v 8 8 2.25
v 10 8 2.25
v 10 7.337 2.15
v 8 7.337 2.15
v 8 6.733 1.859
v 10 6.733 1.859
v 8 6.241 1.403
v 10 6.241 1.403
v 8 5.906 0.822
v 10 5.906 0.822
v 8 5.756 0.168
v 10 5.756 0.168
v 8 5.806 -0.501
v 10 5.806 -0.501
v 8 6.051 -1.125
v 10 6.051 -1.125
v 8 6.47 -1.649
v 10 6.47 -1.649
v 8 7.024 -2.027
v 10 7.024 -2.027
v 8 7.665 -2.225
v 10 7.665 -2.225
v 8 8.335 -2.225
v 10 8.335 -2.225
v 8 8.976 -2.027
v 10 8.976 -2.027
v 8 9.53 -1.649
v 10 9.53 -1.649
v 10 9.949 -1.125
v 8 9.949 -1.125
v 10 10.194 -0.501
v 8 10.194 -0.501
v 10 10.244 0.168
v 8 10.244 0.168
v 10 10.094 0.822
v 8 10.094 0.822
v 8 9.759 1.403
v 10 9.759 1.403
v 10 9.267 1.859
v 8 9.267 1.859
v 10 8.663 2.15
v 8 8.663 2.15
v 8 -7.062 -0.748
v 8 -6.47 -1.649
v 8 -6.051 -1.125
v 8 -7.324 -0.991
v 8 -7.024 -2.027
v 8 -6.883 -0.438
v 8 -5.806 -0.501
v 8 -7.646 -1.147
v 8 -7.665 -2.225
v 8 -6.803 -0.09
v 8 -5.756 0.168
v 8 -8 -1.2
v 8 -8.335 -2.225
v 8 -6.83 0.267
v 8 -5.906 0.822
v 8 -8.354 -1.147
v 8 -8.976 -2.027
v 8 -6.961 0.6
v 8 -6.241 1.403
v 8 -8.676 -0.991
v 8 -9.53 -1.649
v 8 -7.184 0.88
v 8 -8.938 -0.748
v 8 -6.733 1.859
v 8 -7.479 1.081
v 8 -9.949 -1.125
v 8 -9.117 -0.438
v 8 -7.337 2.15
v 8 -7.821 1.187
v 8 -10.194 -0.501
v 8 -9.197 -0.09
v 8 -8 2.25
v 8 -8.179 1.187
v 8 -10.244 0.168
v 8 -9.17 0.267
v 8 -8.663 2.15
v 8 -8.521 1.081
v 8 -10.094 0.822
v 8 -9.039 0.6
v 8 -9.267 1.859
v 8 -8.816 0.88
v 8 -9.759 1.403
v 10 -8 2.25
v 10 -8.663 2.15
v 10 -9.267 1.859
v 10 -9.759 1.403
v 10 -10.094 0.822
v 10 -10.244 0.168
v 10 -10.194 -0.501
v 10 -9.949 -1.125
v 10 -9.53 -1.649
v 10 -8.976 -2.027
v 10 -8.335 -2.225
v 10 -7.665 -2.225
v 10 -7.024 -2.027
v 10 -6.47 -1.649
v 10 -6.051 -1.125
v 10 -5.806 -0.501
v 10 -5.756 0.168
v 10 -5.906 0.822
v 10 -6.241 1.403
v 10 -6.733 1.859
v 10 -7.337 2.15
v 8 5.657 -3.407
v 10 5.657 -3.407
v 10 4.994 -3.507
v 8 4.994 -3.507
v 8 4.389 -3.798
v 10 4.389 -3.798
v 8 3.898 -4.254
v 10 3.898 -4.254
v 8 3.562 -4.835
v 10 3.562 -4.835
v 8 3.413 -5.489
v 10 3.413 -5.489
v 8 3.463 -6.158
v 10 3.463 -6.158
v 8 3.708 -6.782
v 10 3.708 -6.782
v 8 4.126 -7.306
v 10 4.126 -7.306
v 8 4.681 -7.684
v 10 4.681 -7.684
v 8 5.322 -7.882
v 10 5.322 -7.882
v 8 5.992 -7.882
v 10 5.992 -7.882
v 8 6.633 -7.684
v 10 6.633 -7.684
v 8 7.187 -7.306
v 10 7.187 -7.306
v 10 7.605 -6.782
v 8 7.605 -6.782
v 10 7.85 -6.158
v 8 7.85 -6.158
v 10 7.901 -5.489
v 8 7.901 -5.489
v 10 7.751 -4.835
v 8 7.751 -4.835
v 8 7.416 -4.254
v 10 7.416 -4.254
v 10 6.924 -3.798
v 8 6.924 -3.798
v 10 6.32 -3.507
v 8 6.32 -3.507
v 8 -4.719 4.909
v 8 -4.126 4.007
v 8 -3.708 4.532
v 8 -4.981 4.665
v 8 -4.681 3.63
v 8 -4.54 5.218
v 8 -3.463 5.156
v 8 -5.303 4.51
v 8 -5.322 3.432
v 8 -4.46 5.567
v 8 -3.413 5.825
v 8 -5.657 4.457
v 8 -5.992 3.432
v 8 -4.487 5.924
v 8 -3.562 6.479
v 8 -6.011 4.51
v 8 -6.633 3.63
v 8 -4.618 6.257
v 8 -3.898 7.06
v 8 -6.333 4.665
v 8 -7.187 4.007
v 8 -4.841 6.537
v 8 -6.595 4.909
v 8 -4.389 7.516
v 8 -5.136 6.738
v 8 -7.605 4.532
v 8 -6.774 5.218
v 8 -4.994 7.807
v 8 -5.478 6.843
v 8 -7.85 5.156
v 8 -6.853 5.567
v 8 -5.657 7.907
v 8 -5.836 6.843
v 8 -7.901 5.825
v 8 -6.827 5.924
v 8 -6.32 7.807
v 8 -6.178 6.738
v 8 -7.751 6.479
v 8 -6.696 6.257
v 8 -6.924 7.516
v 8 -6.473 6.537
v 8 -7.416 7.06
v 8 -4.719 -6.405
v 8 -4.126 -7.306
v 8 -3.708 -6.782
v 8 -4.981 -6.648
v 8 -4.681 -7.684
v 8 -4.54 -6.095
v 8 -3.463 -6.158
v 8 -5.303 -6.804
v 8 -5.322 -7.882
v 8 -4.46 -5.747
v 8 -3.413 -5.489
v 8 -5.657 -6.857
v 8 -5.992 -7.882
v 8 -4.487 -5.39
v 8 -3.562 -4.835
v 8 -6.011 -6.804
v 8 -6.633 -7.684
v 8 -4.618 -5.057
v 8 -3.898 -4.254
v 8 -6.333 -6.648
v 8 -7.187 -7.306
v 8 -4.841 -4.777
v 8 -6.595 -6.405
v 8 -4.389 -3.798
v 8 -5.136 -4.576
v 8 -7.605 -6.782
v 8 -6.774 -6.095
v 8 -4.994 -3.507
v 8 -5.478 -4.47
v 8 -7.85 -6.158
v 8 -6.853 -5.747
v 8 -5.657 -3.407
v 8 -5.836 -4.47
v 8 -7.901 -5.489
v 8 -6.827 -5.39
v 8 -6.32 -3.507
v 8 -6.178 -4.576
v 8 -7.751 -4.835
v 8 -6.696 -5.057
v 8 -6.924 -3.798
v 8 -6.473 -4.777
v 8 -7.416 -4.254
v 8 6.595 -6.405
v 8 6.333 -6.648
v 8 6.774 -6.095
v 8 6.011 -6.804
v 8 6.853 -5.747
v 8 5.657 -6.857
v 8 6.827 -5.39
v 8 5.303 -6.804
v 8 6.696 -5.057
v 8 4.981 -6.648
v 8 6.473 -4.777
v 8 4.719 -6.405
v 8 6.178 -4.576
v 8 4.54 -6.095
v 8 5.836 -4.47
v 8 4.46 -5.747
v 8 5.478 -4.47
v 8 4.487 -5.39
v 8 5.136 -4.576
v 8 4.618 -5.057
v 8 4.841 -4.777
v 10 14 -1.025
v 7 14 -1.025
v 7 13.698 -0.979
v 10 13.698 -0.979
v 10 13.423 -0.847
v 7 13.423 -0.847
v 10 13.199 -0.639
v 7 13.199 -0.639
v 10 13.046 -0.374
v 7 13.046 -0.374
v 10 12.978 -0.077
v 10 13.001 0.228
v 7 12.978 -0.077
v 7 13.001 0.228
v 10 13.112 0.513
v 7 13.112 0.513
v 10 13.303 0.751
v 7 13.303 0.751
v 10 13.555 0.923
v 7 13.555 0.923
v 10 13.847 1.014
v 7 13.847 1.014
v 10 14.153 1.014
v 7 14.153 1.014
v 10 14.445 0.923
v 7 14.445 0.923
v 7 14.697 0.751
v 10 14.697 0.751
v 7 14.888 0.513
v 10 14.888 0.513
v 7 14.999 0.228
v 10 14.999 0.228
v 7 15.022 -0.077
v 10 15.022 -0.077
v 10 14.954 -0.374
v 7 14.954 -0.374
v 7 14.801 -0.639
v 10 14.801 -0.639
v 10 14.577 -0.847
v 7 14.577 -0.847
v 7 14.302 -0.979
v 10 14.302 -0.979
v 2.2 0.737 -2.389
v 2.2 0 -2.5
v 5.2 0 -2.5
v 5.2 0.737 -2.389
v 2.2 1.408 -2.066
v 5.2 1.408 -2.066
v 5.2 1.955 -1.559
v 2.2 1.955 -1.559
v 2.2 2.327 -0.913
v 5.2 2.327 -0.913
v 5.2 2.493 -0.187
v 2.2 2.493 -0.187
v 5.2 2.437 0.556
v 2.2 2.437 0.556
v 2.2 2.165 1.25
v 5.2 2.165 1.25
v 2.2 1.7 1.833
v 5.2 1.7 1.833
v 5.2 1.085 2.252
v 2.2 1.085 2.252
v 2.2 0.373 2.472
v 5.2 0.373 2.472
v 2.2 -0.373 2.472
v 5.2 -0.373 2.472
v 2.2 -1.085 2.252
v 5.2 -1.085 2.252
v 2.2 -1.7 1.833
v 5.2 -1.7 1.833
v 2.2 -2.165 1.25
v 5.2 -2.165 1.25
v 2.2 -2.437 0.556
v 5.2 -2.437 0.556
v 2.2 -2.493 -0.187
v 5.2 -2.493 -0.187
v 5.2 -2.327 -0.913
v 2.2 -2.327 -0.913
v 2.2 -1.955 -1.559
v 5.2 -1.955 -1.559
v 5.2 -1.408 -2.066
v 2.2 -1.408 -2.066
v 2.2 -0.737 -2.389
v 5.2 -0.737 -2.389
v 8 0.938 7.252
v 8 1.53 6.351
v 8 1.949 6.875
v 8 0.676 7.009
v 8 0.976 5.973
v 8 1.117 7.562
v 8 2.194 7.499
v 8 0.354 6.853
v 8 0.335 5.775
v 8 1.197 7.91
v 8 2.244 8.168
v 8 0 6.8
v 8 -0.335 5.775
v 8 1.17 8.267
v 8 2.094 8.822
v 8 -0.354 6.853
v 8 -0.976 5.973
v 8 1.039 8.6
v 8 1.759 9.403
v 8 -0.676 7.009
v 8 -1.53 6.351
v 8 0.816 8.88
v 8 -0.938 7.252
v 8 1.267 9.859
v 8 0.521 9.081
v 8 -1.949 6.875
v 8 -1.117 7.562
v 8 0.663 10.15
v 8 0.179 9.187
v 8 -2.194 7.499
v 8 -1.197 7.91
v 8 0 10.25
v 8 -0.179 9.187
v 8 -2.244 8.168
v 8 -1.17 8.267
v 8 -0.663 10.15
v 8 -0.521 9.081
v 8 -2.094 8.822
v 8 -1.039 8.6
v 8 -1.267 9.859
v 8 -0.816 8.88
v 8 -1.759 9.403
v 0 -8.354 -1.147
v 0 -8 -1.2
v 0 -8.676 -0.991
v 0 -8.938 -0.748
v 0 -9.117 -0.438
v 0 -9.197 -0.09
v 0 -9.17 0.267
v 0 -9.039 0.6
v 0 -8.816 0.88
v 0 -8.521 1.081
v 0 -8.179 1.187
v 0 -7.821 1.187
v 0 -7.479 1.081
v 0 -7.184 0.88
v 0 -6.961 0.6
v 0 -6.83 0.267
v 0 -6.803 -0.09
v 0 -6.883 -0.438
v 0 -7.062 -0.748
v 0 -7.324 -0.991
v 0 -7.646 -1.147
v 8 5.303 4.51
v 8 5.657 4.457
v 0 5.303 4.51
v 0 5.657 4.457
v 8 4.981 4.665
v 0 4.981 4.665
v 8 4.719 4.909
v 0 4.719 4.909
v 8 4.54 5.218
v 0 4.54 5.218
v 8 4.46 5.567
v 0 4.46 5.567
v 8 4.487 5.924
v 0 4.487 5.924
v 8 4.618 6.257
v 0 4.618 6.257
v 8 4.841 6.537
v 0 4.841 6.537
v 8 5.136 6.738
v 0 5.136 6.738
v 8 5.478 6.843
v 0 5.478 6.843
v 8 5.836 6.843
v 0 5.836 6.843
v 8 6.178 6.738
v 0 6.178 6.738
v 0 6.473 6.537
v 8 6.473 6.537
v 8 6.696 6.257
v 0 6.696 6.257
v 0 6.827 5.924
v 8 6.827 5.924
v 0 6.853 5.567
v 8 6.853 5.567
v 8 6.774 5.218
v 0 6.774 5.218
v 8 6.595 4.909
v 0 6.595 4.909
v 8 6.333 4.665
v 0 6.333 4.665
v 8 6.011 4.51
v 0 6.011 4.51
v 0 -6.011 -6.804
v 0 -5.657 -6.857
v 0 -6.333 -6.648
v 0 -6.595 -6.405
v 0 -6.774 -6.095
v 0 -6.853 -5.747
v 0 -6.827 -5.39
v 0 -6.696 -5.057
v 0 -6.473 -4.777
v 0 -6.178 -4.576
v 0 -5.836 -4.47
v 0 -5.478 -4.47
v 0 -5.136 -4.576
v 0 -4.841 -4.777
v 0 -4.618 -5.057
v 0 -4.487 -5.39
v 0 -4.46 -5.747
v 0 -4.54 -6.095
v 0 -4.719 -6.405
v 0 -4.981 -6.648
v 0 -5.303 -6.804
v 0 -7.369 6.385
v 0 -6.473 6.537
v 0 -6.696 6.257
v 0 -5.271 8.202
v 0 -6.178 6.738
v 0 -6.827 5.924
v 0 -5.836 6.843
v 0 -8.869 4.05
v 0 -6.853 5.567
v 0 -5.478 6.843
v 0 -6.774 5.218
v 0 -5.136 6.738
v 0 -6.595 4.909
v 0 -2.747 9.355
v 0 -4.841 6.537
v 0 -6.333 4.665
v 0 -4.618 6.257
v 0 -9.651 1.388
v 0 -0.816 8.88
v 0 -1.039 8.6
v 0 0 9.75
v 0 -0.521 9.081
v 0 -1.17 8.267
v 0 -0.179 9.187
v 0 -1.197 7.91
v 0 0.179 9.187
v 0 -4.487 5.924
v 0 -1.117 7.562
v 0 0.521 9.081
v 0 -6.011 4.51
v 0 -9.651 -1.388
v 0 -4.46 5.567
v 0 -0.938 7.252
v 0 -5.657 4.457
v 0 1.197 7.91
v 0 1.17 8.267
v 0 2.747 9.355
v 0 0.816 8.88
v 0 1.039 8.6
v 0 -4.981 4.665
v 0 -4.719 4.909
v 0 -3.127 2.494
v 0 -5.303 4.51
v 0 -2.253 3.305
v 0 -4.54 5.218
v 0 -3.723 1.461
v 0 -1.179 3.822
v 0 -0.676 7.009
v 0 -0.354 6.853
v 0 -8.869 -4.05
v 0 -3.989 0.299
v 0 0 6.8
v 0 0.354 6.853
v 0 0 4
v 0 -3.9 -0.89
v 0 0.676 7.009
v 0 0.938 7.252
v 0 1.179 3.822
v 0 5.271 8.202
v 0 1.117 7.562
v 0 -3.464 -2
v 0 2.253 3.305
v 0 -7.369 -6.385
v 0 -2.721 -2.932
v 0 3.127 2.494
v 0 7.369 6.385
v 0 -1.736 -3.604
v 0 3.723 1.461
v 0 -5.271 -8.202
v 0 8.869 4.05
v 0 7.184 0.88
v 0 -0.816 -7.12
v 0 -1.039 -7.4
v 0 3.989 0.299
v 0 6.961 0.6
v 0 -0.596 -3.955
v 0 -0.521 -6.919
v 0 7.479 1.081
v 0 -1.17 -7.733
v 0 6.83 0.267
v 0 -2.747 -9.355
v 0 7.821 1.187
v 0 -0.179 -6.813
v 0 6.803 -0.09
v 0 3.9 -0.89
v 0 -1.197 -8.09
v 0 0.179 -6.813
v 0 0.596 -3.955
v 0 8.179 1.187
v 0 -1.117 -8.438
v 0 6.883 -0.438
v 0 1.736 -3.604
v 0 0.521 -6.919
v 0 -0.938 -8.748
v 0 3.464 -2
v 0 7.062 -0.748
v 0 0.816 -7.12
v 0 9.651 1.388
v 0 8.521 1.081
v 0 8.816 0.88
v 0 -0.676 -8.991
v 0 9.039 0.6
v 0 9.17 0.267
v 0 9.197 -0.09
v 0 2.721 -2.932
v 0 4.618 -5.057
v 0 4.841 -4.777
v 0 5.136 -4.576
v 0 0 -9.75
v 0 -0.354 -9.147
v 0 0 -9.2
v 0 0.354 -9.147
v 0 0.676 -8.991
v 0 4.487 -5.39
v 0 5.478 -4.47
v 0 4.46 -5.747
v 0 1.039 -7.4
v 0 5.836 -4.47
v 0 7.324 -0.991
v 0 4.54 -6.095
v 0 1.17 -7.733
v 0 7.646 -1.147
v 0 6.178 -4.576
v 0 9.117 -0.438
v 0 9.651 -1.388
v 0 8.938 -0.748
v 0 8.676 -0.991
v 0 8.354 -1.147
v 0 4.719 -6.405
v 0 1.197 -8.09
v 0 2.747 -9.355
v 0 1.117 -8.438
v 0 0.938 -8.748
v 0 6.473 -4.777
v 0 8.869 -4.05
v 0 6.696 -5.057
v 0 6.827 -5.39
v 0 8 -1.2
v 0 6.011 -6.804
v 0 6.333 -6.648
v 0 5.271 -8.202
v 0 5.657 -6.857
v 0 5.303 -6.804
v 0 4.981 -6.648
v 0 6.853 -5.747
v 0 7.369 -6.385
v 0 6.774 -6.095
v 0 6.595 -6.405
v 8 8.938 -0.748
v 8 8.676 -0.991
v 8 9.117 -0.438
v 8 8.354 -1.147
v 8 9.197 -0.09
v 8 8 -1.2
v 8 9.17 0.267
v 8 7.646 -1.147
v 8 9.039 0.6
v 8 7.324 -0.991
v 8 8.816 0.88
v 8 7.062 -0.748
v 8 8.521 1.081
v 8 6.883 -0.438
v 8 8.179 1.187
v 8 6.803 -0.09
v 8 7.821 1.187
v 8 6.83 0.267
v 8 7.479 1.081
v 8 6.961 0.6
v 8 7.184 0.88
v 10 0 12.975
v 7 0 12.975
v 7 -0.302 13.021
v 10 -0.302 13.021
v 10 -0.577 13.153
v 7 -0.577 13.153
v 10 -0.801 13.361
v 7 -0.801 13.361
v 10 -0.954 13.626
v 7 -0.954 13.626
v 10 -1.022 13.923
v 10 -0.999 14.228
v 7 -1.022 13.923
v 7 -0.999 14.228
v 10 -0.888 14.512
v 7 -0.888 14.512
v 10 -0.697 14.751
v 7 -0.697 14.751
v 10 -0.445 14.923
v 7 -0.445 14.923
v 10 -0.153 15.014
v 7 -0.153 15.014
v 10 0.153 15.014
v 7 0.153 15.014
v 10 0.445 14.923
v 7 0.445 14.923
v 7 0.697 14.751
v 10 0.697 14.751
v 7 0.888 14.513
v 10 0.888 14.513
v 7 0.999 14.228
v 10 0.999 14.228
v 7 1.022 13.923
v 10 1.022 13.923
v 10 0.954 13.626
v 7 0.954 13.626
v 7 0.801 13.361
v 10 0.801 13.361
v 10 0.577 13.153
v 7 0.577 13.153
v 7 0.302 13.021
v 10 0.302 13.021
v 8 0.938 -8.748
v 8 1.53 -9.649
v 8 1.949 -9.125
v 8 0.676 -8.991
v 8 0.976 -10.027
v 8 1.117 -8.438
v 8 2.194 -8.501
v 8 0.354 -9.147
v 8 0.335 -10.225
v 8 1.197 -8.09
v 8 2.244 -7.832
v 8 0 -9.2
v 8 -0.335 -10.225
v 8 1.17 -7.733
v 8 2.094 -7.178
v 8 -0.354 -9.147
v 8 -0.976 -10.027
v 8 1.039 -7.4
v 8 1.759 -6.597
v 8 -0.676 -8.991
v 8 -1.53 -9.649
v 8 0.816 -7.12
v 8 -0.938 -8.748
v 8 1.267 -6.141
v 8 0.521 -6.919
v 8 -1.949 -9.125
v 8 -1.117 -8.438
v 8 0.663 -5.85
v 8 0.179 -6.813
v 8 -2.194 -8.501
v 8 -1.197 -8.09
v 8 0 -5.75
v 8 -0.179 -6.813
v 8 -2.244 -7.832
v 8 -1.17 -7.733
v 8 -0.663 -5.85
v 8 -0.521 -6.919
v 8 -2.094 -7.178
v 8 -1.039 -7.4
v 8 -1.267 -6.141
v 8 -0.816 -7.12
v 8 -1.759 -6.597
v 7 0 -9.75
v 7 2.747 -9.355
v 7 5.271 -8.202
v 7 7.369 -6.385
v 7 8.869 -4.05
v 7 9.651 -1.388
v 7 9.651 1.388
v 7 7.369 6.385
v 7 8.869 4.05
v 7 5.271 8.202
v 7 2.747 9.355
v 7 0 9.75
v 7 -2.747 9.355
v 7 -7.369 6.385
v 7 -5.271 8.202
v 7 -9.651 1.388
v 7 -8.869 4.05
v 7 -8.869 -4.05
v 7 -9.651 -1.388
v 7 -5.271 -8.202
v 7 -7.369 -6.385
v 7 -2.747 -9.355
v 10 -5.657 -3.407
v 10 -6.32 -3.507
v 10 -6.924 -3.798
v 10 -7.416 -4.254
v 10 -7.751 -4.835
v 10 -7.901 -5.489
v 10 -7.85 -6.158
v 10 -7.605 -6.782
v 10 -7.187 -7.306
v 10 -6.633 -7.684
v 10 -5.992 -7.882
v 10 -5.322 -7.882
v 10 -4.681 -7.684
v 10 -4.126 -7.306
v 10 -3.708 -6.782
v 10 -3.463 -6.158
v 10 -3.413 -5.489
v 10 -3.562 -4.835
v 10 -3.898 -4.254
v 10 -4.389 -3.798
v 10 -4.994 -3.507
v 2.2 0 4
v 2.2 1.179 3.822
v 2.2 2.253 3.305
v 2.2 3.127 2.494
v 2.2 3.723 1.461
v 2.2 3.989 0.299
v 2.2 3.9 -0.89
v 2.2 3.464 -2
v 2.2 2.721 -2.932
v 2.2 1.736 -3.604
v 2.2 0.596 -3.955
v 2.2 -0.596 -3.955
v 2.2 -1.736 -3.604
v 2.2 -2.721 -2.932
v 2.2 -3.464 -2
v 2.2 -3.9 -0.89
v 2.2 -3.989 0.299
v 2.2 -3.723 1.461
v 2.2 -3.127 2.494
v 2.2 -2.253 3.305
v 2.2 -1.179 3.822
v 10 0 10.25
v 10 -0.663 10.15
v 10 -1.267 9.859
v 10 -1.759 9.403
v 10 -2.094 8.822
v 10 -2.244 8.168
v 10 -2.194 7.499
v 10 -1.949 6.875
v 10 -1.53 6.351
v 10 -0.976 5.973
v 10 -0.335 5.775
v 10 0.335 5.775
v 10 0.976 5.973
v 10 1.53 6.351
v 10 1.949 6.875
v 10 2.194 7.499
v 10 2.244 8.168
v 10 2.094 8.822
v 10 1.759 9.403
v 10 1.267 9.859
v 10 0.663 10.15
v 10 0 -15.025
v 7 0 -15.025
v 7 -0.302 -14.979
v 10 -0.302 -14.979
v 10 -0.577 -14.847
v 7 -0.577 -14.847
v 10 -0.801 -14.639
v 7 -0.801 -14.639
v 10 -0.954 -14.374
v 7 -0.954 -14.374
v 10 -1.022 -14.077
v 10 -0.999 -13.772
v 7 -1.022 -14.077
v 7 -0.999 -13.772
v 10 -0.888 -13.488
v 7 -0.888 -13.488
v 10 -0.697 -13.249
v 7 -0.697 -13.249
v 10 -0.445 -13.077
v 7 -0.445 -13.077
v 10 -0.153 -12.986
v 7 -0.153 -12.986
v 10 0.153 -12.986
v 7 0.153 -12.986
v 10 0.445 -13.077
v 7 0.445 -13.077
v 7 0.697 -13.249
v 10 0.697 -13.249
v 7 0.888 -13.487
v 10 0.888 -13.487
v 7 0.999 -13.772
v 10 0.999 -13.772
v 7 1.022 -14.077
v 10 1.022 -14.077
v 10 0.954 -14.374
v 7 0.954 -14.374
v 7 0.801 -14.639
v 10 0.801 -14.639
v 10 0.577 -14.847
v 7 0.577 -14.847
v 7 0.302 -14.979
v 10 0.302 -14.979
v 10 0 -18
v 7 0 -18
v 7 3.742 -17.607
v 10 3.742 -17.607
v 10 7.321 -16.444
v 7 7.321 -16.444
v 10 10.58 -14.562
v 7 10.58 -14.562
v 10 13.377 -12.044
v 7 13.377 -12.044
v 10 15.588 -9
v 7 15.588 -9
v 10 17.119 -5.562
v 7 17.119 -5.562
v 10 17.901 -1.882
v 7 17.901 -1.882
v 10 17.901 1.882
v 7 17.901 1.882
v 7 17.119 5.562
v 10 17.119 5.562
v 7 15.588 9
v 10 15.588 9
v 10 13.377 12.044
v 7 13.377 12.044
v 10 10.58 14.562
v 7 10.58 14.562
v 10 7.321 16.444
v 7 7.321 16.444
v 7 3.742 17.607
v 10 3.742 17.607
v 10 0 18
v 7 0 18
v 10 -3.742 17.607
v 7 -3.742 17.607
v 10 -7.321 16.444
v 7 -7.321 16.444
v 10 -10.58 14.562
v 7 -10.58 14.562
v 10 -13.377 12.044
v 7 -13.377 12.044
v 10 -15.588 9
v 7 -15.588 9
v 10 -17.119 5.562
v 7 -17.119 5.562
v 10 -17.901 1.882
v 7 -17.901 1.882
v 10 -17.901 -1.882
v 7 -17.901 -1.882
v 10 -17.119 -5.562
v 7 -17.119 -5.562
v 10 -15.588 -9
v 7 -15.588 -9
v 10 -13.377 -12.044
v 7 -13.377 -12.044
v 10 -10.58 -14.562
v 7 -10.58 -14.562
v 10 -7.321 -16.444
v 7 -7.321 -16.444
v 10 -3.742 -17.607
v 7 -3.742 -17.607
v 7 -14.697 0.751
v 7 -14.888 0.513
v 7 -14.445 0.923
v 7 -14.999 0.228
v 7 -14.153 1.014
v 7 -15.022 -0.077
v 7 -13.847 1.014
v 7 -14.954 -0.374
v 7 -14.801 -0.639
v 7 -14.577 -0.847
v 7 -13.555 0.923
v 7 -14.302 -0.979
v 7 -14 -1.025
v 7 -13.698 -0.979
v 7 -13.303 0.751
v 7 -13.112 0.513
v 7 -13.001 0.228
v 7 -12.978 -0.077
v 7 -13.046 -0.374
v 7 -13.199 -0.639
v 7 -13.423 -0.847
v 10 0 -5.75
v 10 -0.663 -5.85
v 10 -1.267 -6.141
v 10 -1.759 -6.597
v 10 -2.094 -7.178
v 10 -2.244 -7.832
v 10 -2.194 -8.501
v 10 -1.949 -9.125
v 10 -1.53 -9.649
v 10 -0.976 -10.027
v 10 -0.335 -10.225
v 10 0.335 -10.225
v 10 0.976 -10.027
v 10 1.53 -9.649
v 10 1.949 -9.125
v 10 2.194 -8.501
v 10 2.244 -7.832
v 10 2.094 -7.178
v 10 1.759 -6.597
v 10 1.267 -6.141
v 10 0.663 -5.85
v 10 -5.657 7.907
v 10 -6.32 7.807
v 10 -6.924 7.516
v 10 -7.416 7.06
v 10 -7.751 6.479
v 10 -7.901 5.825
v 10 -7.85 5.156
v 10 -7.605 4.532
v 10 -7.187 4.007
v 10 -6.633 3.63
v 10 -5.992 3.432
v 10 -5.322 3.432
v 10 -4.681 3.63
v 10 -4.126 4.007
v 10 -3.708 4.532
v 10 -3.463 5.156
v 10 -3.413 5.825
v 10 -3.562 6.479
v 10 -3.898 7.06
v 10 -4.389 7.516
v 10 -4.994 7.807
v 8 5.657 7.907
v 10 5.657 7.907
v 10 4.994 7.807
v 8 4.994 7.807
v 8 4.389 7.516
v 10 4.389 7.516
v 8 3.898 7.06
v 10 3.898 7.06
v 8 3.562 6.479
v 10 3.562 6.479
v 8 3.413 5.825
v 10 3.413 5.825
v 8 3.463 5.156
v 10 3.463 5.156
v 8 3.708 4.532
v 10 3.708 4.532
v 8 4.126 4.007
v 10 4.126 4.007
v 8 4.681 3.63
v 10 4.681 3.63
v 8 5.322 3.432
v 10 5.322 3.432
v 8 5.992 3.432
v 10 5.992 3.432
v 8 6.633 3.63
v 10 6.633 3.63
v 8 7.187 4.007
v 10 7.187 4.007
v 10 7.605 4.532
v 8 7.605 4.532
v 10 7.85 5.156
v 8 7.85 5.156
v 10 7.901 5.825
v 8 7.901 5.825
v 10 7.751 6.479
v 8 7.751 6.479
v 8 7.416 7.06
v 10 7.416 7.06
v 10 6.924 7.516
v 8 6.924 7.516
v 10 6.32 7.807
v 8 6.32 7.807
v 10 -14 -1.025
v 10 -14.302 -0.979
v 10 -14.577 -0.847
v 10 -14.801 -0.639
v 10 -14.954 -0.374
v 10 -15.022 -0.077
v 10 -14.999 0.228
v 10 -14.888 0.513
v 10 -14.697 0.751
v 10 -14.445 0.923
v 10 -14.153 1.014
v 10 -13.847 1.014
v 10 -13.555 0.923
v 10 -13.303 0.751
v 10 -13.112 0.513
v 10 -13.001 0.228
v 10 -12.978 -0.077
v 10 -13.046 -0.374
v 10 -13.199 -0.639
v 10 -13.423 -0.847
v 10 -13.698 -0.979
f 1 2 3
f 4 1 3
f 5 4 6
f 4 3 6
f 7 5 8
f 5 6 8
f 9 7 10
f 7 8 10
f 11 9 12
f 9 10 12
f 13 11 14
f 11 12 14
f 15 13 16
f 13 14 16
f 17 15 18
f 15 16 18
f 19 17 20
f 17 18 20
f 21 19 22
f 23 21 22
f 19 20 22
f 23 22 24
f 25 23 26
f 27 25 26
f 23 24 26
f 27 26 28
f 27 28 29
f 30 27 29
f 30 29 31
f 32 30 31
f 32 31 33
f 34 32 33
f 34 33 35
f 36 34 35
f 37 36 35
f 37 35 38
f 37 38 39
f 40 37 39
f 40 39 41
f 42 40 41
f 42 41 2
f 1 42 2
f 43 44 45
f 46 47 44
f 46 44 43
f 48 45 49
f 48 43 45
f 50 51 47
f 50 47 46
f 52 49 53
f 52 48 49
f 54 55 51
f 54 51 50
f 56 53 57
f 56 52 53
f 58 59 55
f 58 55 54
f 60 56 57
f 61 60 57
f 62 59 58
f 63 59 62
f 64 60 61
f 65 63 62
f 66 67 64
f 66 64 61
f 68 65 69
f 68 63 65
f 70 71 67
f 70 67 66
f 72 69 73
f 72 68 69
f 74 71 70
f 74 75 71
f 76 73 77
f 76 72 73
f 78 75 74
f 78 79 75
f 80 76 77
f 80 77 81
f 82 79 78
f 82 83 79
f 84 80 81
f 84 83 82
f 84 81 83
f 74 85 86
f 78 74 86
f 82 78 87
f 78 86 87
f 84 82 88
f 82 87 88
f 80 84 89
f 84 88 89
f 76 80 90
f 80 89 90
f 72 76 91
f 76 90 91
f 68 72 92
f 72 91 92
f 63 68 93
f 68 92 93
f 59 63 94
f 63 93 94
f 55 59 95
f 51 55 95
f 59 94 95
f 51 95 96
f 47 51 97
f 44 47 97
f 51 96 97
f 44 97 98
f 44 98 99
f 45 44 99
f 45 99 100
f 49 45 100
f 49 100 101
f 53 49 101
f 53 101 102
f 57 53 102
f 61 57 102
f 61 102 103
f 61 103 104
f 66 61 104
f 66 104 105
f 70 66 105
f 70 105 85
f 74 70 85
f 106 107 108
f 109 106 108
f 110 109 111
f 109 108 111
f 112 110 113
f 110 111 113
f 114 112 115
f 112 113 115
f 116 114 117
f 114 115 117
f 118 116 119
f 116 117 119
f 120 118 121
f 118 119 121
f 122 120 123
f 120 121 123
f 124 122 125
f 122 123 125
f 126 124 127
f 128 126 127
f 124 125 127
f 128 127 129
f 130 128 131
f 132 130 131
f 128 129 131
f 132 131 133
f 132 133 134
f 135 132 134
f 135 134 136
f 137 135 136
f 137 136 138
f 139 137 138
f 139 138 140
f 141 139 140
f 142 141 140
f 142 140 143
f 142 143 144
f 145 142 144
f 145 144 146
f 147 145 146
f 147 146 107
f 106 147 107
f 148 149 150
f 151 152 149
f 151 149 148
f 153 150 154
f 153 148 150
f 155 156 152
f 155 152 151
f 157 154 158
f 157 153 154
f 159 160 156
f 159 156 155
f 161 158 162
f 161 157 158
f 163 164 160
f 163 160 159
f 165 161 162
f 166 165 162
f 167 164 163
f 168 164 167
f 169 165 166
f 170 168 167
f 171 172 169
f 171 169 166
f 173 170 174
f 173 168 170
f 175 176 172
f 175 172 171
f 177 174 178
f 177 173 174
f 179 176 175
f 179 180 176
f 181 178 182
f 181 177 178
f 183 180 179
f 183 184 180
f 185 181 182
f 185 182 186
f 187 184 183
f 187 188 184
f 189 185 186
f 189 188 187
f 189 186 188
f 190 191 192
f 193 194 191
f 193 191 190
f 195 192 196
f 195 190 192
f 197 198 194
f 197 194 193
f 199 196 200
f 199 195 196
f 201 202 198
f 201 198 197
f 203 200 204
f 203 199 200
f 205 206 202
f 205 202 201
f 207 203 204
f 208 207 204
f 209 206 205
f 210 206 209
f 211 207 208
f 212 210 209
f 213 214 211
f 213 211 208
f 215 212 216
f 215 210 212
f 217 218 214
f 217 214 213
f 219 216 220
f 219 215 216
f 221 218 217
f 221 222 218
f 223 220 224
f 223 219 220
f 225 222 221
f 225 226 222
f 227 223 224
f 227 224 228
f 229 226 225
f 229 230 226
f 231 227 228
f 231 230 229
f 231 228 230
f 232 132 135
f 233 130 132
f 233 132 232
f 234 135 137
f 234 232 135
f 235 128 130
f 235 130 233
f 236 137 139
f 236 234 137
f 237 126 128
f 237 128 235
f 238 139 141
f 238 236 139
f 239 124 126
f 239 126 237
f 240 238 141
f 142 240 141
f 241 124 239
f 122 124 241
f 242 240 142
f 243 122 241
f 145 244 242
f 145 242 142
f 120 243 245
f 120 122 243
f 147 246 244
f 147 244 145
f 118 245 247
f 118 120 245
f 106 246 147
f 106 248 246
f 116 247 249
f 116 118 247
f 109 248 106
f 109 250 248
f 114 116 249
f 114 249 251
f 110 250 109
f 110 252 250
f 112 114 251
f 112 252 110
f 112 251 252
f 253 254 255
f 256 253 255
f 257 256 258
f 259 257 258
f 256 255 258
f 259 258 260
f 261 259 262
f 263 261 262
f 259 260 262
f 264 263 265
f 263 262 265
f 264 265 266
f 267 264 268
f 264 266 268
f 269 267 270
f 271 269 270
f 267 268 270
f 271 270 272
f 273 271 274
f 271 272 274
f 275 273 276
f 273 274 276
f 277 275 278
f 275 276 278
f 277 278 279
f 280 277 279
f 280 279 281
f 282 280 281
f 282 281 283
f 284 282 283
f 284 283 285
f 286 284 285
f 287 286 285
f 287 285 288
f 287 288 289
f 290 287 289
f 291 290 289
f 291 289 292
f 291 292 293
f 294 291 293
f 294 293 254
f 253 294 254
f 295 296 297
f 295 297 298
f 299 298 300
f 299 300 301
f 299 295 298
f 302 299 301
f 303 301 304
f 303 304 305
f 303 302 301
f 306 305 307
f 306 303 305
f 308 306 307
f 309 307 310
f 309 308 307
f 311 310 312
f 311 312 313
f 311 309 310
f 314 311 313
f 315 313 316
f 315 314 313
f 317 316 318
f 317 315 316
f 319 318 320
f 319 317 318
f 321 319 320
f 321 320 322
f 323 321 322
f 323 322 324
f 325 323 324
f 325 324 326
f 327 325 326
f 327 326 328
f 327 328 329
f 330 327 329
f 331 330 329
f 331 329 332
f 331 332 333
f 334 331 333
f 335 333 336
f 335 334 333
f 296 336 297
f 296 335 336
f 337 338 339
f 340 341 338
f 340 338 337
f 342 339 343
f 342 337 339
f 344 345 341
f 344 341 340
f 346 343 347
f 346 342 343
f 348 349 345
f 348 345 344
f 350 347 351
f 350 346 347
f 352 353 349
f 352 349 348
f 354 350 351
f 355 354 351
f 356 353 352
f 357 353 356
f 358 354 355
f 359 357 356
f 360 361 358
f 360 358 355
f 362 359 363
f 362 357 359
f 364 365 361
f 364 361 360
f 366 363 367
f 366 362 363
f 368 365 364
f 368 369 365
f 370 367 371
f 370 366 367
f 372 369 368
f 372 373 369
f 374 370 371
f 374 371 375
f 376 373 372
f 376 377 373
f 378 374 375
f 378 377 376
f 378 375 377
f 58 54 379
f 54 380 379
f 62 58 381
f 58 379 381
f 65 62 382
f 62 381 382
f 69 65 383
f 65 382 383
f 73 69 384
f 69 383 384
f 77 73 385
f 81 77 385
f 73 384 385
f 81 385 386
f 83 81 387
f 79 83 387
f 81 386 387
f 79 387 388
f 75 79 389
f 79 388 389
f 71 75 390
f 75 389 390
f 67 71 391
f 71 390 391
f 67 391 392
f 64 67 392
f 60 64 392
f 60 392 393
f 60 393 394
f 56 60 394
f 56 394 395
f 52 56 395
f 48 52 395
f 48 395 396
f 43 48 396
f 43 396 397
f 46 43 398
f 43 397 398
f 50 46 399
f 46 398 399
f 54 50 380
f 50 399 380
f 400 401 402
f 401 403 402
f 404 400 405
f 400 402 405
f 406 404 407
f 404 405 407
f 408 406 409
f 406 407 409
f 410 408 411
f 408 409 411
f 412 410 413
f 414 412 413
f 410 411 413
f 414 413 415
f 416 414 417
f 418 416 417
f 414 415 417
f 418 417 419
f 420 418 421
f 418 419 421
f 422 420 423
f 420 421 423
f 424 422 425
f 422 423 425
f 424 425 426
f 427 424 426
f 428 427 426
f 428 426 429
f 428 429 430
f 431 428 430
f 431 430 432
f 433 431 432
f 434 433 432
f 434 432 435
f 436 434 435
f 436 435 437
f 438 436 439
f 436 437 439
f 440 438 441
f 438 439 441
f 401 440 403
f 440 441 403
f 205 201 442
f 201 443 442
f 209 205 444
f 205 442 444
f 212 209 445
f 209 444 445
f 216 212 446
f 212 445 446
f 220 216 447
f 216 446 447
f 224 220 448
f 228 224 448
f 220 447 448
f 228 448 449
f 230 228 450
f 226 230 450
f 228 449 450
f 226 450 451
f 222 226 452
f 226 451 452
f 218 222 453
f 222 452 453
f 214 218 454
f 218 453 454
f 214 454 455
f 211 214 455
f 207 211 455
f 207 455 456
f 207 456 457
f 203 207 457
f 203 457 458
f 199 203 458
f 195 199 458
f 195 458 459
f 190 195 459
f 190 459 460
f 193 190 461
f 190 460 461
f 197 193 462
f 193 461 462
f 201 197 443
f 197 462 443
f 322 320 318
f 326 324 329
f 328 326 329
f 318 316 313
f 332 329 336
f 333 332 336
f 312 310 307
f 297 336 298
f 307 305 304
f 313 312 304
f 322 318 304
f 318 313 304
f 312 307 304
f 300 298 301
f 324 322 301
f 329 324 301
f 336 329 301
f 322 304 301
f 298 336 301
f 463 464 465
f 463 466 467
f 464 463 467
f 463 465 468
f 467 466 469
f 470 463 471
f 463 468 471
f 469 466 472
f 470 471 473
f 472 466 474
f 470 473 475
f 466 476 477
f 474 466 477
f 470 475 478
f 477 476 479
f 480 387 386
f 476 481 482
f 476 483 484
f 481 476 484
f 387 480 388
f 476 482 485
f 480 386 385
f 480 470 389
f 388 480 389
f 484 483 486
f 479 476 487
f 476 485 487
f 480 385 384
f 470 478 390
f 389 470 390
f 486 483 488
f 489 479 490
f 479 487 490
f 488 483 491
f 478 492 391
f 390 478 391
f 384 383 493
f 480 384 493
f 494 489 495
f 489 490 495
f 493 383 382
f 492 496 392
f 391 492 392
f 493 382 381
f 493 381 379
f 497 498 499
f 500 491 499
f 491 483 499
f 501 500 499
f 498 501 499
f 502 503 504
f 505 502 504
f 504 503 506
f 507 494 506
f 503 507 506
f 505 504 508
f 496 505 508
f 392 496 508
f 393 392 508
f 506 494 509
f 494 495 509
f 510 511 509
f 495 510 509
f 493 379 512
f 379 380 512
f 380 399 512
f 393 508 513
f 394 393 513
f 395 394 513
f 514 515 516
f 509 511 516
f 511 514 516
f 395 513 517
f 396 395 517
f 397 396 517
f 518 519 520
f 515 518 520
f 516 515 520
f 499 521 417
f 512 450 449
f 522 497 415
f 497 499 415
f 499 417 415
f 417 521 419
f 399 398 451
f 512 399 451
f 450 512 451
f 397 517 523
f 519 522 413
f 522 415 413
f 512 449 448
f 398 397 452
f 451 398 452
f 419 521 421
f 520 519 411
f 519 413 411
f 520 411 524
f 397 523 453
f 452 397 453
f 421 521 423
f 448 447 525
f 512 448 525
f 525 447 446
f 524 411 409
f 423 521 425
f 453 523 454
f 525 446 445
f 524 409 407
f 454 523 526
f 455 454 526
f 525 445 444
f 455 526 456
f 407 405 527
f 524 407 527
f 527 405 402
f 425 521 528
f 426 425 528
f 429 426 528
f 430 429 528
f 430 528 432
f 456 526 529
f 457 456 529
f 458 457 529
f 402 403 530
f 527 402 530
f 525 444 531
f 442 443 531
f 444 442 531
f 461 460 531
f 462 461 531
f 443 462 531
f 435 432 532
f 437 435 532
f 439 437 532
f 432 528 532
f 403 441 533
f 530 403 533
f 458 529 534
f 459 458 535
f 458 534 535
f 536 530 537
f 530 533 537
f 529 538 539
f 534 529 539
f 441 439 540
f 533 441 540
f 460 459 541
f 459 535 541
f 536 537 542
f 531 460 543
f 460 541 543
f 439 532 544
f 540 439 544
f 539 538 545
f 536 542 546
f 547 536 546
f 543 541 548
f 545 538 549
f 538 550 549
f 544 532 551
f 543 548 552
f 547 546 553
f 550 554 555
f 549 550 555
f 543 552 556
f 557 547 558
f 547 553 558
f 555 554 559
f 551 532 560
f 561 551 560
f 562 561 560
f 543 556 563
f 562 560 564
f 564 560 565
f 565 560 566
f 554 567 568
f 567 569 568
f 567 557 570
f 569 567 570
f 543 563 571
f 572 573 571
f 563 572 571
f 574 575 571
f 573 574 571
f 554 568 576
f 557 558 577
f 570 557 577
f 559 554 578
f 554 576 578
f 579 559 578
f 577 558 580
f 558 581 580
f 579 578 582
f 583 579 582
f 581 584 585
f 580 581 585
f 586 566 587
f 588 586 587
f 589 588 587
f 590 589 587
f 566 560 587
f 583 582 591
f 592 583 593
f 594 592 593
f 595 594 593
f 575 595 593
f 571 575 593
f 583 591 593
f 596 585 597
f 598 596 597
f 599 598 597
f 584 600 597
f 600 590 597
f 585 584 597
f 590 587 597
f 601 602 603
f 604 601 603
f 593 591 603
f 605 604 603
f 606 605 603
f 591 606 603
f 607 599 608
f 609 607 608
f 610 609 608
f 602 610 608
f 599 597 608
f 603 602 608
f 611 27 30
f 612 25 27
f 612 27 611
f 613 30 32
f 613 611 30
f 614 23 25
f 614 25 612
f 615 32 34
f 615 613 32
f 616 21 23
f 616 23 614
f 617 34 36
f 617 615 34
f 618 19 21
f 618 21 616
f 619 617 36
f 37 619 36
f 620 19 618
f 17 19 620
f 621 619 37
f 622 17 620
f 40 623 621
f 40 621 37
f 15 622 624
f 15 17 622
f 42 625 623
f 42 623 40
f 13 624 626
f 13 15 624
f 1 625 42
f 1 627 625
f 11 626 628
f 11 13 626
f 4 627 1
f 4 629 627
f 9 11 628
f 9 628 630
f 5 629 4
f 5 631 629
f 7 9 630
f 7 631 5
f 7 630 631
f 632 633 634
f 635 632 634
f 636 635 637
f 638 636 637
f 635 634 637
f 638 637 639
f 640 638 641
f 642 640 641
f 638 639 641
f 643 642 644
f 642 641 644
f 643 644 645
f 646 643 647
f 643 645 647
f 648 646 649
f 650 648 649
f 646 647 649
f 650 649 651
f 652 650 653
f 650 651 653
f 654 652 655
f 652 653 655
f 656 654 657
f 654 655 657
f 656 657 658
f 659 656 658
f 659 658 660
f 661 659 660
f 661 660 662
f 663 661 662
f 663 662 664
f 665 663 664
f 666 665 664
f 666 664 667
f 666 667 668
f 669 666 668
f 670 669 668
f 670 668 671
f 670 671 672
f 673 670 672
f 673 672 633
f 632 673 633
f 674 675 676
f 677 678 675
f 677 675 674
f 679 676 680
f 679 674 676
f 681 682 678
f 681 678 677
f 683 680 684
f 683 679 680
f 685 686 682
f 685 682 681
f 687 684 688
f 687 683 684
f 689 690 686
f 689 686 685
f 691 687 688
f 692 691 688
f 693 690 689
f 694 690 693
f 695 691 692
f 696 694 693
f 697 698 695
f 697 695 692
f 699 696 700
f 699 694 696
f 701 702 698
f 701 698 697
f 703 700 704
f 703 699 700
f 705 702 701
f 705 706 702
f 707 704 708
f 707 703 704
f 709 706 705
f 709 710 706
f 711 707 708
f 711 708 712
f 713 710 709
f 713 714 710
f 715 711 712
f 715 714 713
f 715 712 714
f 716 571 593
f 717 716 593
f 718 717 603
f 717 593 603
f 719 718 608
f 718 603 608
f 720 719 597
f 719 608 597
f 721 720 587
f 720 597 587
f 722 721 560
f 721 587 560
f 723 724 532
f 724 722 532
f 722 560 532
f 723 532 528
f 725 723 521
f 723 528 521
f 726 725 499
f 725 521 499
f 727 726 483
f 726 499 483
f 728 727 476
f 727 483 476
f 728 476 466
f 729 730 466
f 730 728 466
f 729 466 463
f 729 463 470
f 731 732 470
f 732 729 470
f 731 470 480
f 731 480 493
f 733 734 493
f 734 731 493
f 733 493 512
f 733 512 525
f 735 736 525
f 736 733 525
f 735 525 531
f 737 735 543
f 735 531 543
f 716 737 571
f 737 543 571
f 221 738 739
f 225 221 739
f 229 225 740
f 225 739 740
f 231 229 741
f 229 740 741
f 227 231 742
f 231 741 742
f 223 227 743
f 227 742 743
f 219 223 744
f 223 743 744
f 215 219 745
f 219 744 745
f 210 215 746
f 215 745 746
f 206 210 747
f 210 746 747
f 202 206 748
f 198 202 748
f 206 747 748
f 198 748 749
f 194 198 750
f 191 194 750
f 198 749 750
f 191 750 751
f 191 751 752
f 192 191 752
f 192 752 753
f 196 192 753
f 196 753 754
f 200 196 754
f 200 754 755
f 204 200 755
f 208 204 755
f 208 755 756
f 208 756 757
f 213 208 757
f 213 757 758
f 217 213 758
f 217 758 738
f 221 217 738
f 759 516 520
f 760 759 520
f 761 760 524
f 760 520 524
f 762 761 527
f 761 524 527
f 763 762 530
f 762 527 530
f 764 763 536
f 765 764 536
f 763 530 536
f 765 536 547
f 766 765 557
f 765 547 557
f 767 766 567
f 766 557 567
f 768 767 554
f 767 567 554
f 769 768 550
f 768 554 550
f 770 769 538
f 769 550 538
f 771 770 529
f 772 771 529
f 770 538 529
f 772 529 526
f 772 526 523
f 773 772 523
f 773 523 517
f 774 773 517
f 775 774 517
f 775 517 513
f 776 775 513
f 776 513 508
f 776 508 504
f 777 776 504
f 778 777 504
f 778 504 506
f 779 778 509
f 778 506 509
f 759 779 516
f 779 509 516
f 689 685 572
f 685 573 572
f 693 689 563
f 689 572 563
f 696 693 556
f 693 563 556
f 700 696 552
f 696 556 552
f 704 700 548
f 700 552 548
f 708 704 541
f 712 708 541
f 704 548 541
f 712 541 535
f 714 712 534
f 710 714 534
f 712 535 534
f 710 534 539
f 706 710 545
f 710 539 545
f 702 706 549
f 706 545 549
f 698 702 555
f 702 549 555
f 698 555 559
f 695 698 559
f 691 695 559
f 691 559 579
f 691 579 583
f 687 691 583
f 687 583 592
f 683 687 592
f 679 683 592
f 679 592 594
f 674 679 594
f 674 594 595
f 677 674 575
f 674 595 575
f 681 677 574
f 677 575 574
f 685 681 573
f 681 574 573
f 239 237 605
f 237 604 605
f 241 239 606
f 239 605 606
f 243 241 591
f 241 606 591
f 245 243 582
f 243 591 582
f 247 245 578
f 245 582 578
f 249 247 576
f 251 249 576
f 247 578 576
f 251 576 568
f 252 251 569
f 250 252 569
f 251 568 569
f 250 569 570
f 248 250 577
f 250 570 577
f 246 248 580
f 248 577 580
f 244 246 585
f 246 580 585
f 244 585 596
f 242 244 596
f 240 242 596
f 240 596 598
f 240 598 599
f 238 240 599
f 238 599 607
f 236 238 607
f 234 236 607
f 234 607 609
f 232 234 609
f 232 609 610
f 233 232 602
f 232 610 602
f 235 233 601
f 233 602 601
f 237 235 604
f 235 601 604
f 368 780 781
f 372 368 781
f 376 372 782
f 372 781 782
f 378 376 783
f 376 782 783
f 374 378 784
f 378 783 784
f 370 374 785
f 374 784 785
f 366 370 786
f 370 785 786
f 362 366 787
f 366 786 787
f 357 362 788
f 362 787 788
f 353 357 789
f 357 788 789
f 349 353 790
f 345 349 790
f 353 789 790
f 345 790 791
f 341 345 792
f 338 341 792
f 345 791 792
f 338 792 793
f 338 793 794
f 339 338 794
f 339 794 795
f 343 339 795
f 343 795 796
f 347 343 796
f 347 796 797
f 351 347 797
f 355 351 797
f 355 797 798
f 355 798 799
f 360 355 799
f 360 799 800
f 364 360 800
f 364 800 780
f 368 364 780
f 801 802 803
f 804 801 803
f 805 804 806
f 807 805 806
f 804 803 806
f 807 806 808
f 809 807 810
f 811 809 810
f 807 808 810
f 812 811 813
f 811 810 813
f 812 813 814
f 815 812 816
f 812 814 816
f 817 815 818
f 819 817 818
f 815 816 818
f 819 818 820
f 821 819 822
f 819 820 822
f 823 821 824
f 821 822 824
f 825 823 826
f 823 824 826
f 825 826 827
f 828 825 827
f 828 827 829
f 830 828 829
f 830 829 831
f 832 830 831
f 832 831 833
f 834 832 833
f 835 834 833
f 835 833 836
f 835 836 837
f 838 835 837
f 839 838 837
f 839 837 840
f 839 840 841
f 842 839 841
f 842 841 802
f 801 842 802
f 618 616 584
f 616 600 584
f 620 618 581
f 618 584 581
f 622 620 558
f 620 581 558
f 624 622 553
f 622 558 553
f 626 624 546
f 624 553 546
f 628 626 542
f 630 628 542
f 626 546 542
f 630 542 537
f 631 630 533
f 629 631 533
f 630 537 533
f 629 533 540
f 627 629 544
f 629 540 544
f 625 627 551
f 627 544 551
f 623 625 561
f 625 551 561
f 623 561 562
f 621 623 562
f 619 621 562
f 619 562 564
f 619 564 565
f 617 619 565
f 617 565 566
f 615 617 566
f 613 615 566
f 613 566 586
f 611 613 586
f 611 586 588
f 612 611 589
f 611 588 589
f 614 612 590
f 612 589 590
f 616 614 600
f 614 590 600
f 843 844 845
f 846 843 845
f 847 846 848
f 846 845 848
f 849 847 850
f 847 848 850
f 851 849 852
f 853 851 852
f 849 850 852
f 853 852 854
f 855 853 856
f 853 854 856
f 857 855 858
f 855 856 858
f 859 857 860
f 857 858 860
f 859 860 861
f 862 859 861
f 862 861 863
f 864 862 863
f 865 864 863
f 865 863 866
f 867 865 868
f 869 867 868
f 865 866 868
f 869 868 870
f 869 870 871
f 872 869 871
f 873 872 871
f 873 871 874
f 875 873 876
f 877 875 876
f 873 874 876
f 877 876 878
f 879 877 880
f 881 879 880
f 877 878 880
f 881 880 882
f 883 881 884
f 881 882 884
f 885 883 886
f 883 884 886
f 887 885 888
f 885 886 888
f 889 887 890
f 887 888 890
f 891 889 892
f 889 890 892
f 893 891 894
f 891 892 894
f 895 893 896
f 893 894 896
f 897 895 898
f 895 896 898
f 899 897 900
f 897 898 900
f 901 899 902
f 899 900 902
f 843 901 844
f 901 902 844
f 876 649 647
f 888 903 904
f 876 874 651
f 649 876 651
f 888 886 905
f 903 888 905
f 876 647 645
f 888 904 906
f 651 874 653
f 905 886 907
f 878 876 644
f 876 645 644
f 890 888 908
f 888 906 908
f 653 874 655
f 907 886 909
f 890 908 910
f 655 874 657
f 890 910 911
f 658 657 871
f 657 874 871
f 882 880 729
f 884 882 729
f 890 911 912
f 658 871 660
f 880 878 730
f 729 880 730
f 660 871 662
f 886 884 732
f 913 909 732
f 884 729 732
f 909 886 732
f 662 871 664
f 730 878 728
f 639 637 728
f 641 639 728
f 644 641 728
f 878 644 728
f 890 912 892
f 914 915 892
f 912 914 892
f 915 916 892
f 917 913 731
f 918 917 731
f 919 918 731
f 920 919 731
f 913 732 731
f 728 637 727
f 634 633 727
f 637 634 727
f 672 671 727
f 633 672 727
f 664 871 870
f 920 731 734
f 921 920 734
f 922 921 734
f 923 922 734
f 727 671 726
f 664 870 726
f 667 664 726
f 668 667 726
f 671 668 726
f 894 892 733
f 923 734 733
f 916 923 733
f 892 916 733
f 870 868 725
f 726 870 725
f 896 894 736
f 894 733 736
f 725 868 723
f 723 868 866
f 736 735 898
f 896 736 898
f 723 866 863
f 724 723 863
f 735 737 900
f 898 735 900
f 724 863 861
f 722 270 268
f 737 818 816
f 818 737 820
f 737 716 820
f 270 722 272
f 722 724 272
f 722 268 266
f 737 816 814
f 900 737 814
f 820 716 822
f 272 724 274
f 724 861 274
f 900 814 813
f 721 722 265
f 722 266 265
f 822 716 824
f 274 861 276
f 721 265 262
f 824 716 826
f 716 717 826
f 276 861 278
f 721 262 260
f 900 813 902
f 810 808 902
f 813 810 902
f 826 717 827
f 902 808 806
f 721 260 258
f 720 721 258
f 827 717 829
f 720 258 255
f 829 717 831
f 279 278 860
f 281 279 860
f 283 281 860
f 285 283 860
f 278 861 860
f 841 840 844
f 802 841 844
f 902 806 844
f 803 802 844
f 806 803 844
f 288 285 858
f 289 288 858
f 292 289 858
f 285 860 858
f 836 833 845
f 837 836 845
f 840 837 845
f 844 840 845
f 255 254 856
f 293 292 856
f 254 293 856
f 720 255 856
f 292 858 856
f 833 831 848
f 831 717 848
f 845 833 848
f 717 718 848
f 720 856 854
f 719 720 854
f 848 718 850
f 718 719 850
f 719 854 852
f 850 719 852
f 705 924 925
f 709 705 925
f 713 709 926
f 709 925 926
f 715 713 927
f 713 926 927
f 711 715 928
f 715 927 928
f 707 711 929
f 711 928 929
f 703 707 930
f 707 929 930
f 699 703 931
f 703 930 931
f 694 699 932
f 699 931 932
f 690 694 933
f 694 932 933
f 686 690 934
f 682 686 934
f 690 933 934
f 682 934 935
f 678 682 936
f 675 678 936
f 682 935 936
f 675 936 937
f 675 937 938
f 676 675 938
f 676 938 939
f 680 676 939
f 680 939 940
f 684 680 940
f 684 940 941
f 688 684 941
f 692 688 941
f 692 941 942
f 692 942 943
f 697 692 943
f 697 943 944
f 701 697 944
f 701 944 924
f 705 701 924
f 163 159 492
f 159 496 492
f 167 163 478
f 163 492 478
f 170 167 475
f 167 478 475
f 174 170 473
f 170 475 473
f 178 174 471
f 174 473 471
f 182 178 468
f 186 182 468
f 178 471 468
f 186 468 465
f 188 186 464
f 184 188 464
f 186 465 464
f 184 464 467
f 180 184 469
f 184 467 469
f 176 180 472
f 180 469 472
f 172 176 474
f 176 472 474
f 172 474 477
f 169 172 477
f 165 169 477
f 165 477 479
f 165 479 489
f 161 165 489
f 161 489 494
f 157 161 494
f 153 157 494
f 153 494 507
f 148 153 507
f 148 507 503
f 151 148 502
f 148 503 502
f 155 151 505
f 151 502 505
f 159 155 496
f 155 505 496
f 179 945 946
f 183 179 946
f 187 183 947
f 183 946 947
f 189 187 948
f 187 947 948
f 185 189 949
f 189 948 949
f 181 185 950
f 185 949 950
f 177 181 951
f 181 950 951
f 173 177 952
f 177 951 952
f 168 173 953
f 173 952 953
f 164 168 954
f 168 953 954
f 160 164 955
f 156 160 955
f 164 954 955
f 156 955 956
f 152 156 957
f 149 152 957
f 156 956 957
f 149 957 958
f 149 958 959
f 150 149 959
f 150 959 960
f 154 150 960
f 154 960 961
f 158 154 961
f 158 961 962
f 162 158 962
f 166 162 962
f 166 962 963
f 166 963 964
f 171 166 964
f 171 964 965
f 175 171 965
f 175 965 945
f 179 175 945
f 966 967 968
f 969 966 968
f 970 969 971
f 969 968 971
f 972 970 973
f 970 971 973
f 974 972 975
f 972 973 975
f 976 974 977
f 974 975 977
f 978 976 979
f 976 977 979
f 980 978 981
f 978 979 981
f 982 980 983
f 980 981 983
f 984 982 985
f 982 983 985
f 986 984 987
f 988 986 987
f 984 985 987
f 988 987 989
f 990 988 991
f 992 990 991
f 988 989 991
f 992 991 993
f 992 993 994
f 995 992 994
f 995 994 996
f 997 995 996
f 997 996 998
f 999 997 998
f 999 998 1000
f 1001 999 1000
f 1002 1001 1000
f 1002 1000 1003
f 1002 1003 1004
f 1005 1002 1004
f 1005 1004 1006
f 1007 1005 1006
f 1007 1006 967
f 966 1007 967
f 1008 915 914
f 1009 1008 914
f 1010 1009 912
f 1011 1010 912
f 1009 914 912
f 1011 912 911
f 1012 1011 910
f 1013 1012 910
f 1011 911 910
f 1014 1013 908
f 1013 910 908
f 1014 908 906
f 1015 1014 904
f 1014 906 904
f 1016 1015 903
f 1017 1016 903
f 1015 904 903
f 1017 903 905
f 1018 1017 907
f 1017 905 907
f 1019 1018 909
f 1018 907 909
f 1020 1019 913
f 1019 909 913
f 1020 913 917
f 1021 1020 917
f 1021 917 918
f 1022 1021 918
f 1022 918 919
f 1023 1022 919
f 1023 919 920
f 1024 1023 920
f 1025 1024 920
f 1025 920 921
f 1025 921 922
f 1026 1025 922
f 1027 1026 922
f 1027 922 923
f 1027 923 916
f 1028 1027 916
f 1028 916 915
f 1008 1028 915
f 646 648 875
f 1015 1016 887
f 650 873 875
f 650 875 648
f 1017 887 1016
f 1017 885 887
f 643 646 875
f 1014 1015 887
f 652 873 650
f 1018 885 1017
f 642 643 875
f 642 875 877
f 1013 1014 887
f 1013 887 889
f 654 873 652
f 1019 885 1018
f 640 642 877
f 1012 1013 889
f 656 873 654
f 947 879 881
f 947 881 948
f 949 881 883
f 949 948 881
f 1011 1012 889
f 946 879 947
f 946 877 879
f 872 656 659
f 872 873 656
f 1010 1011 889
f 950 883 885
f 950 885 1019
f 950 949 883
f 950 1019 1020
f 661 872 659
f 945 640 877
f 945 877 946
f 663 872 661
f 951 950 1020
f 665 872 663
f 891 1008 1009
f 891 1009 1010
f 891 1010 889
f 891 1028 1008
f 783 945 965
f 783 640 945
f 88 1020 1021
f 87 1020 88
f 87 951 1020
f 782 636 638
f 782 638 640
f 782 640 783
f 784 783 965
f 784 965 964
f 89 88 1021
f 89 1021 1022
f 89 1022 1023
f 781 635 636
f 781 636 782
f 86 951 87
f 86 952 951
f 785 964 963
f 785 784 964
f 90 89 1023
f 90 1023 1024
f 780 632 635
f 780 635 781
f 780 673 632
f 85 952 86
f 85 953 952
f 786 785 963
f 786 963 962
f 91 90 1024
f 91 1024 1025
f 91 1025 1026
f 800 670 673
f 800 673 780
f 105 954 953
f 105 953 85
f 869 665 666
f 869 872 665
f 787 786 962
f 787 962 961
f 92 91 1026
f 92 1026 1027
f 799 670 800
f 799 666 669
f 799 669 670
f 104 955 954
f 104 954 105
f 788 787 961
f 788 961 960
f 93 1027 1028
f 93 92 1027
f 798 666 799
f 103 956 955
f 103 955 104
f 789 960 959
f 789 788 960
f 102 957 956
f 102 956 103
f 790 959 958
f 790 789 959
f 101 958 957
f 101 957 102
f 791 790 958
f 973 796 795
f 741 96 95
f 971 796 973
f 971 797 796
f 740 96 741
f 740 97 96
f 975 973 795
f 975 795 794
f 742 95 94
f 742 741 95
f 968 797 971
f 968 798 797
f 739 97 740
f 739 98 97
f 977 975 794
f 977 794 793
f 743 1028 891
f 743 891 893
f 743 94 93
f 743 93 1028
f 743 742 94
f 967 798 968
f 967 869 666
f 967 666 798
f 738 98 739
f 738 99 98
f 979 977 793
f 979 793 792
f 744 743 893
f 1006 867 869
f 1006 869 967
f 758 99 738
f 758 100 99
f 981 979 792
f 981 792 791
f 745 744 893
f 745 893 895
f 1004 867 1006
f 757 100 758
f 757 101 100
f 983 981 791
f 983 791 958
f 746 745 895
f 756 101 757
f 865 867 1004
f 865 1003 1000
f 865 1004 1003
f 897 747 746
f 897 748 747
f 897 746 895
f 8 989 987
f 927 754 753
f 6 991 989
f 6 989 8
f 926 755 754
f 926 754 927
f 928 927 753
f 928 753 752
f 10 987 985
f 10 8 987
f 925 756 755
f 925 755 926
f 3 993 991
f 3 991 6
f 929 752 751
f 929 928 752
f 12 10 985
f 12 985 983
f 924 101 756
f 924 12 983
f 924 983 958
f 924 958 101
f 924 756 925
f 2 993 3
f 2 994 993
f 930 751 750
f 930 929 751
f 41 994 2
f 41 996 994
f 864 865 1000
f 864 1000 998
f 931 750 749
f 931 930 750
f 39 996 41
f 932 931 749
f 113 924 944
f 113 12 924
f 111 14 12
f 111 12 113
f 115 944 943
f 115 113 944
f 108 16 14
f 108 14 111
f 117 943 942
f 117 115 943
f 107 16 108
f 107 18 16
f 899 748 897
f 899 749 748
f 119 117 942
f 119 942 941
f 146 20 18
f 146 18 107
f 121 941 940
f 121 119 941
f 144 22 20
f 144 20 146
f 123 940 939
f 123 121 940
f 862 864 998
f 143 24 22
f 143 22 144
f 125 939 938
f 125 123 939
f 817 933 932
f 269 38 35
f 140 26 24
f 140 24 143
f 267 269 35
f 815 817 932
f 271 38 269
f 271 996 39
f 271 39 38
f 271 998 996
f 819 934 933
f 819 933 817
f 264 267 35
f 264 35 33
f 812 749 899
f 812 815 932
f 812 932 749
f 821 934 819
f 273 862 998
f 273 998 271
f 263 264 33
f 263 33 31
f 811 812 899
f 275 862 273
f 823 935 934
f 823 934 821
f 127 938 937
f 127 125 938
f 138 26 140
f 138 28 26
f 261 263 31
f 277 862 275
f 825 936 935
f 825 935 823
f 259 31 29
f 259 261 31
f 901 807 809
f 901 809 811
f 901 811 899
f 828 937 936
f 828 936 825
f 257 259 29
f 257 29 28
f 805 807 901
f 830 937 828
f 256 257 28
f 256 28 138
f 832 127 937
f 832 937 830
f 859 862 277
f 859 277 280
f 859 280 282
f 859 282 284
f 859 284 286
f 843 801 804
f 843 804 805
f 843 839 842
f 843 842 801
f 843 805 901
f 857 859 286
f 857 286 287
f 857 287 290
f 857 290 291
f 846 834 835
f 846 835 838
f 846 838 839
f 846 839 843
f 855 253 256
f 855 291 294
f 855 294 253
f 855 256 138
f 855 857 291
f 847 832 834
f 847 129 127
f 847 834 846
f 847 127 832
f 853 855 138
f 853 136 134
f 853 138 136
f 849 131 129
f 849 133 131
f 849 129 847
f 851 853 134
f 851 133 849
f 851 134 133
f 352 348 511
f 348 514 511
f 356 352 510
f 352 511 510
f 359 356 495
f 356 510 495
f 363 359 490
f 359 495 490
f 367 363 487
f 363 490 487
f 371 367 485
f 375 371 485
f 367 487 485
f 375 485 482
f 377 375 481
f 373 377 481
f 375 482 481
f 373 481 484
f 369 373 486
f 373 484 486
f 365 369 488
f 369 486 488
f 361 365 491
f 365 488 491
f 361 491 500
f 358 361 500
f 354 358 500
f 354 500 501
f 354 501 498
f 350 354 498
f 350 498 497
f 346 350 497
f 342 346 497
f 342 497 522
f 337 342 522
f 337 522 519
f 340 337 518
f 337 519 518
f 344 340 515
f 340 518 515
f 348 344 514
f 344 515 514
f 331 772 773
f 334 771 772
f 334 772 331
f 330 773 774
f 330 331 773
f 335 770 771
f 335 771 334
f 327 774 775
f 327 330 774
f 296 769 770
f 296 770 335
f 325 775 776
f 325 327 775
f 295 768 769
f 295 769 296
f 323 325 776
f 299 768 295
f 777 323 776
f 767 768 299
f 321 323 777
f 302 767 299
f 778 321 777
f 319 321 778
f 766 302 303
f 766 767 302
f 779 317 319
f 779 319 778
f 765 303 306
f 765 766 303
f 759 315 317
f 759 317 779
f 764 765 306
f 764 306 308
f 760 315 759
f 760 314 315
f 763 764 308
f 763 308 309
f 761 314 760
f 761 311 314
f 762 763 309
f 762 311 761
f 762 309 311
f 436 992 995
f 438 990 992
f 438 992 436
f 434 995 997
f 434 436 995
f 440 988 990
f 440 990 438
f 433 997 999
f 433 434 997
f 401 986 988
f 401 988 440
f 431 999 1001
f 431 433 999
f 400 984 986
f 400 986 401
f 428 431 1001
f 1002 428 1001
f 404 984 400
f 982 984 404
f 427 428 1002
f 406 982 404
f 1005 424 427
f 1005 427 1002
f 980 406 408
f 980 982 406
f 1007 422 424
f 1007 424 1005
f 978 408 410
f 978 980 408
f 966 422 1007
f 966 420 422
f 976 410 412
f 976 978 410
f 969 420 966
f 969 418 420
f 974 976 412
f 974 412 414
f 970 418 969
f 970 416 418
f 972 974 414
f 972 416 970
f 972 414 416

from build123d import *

# Parameters (mm, degrees)
SKETCH1_R                                       = 9.75
BOSS_EXTRUDE1_DEPTH                             = 10
SKETCH6_R                                       = 18
BOSS_EXTRUDE2_DEPTH                             = 3
CBORE_FOR_M2_SOCKET_HEAD_CAP_SCREW5_D           = 2.4
CBORE_FOR_M2_SOCKET_HEAD_CAP_SCREW5_CBORE_D     = 4.5
CBORE_FOR_M2_SOCKET_HEAD_CAP_SCREW5_CBORE_DEPTH = 2
SKETCH14_R                                      = 4
CUT_EXTRUDE1_DEPTH                              = 2.2
M2_5_TAPPED_HOLE1_D                             = 2.05
SKETCH16_R                                      = 2.5
CUT_EXTRUDE2_DEPTH                              = 3


with BuildPart() as part:
    # Sketch1 → Boss-Extrude1 (new body)
    with BuildSketch(Plane(origin=(0, 0, 0), x_dir=(0, 0, -1), z_dir=(1, 0, 0))):
        Circle(SKETCH1_R)
    extrude(amount=BOSS_EXTRUDE1_DEPTH)

    # Sketch6 → Boss-Extrude2 (add)
    with BuildSketch(Plane(origin=(7, 0, 0), x_dir=(0, 0, -1), z_dir=(1, 0, 0))):
        Circle(SKETCH6_R)
    extrude(amount=BOSS_EXTRUDE2_DEPTH)

    # CBORE for M2 Socket Head Cap Screw5 (through all)
    with Locations(Plane(origin=(10, 8, 0), x_dir=(0, 0, 1), z_dir=(1, 0, 0))):
        with Locations((0, 0), (-5.656854249, 2.343145751), (-8, 8), (-5.656854249, 13.656854249), (0, 16), (5.656854249, 13.656854249), (8, 8), (5.656854249, 2.343145751)):
            CounterBoreHole(CBORE_FOR_M2_SOCKET_HEAD_CAP_SCREW5_D / 2, CBORE_FOR_M2_SOCKET_HEAD_CAP_SCREW5_CBORE_D / 2, CBORE_FOR_M2_SOCKET_HEAD_CAP_SCREW5_CBORE_DEPTH)

    # Sketch14 → Cut-Extrude1 (cut)
    with BuildSketch(Plane.ZY):
        Circle(SKETCH14_R)
    extrude(amount=-CUT_EXTRUDE1_DEPTH, mode=Mode.SUBTRACT)

    # M2.5 Tapped Hole1 (through all)
    with Locations(Plane(origin=(10, 14, 0), x_dir=(0, 0, 1), z_dir=(1, 0, 0))):
        with Locations((0, 0), (-14, 14), (0, 28), (14, 14)):
            Hole(M2_5_TAPPED_HOLE1_D / 2)

    # Sketch16 → Cut-Extrude2 (cut)
    with BuildSketch(Plane(origin=(2.2, 0, 0), x_dir=(0, 0, -1), z_dir=(1, 0, 0))):
        Circle(SKETCH16_R)
    extrude(amount=CUT_EXTRUDE2_DEPTH, mode=Mode.SUBTRACT)


solid = part.part
